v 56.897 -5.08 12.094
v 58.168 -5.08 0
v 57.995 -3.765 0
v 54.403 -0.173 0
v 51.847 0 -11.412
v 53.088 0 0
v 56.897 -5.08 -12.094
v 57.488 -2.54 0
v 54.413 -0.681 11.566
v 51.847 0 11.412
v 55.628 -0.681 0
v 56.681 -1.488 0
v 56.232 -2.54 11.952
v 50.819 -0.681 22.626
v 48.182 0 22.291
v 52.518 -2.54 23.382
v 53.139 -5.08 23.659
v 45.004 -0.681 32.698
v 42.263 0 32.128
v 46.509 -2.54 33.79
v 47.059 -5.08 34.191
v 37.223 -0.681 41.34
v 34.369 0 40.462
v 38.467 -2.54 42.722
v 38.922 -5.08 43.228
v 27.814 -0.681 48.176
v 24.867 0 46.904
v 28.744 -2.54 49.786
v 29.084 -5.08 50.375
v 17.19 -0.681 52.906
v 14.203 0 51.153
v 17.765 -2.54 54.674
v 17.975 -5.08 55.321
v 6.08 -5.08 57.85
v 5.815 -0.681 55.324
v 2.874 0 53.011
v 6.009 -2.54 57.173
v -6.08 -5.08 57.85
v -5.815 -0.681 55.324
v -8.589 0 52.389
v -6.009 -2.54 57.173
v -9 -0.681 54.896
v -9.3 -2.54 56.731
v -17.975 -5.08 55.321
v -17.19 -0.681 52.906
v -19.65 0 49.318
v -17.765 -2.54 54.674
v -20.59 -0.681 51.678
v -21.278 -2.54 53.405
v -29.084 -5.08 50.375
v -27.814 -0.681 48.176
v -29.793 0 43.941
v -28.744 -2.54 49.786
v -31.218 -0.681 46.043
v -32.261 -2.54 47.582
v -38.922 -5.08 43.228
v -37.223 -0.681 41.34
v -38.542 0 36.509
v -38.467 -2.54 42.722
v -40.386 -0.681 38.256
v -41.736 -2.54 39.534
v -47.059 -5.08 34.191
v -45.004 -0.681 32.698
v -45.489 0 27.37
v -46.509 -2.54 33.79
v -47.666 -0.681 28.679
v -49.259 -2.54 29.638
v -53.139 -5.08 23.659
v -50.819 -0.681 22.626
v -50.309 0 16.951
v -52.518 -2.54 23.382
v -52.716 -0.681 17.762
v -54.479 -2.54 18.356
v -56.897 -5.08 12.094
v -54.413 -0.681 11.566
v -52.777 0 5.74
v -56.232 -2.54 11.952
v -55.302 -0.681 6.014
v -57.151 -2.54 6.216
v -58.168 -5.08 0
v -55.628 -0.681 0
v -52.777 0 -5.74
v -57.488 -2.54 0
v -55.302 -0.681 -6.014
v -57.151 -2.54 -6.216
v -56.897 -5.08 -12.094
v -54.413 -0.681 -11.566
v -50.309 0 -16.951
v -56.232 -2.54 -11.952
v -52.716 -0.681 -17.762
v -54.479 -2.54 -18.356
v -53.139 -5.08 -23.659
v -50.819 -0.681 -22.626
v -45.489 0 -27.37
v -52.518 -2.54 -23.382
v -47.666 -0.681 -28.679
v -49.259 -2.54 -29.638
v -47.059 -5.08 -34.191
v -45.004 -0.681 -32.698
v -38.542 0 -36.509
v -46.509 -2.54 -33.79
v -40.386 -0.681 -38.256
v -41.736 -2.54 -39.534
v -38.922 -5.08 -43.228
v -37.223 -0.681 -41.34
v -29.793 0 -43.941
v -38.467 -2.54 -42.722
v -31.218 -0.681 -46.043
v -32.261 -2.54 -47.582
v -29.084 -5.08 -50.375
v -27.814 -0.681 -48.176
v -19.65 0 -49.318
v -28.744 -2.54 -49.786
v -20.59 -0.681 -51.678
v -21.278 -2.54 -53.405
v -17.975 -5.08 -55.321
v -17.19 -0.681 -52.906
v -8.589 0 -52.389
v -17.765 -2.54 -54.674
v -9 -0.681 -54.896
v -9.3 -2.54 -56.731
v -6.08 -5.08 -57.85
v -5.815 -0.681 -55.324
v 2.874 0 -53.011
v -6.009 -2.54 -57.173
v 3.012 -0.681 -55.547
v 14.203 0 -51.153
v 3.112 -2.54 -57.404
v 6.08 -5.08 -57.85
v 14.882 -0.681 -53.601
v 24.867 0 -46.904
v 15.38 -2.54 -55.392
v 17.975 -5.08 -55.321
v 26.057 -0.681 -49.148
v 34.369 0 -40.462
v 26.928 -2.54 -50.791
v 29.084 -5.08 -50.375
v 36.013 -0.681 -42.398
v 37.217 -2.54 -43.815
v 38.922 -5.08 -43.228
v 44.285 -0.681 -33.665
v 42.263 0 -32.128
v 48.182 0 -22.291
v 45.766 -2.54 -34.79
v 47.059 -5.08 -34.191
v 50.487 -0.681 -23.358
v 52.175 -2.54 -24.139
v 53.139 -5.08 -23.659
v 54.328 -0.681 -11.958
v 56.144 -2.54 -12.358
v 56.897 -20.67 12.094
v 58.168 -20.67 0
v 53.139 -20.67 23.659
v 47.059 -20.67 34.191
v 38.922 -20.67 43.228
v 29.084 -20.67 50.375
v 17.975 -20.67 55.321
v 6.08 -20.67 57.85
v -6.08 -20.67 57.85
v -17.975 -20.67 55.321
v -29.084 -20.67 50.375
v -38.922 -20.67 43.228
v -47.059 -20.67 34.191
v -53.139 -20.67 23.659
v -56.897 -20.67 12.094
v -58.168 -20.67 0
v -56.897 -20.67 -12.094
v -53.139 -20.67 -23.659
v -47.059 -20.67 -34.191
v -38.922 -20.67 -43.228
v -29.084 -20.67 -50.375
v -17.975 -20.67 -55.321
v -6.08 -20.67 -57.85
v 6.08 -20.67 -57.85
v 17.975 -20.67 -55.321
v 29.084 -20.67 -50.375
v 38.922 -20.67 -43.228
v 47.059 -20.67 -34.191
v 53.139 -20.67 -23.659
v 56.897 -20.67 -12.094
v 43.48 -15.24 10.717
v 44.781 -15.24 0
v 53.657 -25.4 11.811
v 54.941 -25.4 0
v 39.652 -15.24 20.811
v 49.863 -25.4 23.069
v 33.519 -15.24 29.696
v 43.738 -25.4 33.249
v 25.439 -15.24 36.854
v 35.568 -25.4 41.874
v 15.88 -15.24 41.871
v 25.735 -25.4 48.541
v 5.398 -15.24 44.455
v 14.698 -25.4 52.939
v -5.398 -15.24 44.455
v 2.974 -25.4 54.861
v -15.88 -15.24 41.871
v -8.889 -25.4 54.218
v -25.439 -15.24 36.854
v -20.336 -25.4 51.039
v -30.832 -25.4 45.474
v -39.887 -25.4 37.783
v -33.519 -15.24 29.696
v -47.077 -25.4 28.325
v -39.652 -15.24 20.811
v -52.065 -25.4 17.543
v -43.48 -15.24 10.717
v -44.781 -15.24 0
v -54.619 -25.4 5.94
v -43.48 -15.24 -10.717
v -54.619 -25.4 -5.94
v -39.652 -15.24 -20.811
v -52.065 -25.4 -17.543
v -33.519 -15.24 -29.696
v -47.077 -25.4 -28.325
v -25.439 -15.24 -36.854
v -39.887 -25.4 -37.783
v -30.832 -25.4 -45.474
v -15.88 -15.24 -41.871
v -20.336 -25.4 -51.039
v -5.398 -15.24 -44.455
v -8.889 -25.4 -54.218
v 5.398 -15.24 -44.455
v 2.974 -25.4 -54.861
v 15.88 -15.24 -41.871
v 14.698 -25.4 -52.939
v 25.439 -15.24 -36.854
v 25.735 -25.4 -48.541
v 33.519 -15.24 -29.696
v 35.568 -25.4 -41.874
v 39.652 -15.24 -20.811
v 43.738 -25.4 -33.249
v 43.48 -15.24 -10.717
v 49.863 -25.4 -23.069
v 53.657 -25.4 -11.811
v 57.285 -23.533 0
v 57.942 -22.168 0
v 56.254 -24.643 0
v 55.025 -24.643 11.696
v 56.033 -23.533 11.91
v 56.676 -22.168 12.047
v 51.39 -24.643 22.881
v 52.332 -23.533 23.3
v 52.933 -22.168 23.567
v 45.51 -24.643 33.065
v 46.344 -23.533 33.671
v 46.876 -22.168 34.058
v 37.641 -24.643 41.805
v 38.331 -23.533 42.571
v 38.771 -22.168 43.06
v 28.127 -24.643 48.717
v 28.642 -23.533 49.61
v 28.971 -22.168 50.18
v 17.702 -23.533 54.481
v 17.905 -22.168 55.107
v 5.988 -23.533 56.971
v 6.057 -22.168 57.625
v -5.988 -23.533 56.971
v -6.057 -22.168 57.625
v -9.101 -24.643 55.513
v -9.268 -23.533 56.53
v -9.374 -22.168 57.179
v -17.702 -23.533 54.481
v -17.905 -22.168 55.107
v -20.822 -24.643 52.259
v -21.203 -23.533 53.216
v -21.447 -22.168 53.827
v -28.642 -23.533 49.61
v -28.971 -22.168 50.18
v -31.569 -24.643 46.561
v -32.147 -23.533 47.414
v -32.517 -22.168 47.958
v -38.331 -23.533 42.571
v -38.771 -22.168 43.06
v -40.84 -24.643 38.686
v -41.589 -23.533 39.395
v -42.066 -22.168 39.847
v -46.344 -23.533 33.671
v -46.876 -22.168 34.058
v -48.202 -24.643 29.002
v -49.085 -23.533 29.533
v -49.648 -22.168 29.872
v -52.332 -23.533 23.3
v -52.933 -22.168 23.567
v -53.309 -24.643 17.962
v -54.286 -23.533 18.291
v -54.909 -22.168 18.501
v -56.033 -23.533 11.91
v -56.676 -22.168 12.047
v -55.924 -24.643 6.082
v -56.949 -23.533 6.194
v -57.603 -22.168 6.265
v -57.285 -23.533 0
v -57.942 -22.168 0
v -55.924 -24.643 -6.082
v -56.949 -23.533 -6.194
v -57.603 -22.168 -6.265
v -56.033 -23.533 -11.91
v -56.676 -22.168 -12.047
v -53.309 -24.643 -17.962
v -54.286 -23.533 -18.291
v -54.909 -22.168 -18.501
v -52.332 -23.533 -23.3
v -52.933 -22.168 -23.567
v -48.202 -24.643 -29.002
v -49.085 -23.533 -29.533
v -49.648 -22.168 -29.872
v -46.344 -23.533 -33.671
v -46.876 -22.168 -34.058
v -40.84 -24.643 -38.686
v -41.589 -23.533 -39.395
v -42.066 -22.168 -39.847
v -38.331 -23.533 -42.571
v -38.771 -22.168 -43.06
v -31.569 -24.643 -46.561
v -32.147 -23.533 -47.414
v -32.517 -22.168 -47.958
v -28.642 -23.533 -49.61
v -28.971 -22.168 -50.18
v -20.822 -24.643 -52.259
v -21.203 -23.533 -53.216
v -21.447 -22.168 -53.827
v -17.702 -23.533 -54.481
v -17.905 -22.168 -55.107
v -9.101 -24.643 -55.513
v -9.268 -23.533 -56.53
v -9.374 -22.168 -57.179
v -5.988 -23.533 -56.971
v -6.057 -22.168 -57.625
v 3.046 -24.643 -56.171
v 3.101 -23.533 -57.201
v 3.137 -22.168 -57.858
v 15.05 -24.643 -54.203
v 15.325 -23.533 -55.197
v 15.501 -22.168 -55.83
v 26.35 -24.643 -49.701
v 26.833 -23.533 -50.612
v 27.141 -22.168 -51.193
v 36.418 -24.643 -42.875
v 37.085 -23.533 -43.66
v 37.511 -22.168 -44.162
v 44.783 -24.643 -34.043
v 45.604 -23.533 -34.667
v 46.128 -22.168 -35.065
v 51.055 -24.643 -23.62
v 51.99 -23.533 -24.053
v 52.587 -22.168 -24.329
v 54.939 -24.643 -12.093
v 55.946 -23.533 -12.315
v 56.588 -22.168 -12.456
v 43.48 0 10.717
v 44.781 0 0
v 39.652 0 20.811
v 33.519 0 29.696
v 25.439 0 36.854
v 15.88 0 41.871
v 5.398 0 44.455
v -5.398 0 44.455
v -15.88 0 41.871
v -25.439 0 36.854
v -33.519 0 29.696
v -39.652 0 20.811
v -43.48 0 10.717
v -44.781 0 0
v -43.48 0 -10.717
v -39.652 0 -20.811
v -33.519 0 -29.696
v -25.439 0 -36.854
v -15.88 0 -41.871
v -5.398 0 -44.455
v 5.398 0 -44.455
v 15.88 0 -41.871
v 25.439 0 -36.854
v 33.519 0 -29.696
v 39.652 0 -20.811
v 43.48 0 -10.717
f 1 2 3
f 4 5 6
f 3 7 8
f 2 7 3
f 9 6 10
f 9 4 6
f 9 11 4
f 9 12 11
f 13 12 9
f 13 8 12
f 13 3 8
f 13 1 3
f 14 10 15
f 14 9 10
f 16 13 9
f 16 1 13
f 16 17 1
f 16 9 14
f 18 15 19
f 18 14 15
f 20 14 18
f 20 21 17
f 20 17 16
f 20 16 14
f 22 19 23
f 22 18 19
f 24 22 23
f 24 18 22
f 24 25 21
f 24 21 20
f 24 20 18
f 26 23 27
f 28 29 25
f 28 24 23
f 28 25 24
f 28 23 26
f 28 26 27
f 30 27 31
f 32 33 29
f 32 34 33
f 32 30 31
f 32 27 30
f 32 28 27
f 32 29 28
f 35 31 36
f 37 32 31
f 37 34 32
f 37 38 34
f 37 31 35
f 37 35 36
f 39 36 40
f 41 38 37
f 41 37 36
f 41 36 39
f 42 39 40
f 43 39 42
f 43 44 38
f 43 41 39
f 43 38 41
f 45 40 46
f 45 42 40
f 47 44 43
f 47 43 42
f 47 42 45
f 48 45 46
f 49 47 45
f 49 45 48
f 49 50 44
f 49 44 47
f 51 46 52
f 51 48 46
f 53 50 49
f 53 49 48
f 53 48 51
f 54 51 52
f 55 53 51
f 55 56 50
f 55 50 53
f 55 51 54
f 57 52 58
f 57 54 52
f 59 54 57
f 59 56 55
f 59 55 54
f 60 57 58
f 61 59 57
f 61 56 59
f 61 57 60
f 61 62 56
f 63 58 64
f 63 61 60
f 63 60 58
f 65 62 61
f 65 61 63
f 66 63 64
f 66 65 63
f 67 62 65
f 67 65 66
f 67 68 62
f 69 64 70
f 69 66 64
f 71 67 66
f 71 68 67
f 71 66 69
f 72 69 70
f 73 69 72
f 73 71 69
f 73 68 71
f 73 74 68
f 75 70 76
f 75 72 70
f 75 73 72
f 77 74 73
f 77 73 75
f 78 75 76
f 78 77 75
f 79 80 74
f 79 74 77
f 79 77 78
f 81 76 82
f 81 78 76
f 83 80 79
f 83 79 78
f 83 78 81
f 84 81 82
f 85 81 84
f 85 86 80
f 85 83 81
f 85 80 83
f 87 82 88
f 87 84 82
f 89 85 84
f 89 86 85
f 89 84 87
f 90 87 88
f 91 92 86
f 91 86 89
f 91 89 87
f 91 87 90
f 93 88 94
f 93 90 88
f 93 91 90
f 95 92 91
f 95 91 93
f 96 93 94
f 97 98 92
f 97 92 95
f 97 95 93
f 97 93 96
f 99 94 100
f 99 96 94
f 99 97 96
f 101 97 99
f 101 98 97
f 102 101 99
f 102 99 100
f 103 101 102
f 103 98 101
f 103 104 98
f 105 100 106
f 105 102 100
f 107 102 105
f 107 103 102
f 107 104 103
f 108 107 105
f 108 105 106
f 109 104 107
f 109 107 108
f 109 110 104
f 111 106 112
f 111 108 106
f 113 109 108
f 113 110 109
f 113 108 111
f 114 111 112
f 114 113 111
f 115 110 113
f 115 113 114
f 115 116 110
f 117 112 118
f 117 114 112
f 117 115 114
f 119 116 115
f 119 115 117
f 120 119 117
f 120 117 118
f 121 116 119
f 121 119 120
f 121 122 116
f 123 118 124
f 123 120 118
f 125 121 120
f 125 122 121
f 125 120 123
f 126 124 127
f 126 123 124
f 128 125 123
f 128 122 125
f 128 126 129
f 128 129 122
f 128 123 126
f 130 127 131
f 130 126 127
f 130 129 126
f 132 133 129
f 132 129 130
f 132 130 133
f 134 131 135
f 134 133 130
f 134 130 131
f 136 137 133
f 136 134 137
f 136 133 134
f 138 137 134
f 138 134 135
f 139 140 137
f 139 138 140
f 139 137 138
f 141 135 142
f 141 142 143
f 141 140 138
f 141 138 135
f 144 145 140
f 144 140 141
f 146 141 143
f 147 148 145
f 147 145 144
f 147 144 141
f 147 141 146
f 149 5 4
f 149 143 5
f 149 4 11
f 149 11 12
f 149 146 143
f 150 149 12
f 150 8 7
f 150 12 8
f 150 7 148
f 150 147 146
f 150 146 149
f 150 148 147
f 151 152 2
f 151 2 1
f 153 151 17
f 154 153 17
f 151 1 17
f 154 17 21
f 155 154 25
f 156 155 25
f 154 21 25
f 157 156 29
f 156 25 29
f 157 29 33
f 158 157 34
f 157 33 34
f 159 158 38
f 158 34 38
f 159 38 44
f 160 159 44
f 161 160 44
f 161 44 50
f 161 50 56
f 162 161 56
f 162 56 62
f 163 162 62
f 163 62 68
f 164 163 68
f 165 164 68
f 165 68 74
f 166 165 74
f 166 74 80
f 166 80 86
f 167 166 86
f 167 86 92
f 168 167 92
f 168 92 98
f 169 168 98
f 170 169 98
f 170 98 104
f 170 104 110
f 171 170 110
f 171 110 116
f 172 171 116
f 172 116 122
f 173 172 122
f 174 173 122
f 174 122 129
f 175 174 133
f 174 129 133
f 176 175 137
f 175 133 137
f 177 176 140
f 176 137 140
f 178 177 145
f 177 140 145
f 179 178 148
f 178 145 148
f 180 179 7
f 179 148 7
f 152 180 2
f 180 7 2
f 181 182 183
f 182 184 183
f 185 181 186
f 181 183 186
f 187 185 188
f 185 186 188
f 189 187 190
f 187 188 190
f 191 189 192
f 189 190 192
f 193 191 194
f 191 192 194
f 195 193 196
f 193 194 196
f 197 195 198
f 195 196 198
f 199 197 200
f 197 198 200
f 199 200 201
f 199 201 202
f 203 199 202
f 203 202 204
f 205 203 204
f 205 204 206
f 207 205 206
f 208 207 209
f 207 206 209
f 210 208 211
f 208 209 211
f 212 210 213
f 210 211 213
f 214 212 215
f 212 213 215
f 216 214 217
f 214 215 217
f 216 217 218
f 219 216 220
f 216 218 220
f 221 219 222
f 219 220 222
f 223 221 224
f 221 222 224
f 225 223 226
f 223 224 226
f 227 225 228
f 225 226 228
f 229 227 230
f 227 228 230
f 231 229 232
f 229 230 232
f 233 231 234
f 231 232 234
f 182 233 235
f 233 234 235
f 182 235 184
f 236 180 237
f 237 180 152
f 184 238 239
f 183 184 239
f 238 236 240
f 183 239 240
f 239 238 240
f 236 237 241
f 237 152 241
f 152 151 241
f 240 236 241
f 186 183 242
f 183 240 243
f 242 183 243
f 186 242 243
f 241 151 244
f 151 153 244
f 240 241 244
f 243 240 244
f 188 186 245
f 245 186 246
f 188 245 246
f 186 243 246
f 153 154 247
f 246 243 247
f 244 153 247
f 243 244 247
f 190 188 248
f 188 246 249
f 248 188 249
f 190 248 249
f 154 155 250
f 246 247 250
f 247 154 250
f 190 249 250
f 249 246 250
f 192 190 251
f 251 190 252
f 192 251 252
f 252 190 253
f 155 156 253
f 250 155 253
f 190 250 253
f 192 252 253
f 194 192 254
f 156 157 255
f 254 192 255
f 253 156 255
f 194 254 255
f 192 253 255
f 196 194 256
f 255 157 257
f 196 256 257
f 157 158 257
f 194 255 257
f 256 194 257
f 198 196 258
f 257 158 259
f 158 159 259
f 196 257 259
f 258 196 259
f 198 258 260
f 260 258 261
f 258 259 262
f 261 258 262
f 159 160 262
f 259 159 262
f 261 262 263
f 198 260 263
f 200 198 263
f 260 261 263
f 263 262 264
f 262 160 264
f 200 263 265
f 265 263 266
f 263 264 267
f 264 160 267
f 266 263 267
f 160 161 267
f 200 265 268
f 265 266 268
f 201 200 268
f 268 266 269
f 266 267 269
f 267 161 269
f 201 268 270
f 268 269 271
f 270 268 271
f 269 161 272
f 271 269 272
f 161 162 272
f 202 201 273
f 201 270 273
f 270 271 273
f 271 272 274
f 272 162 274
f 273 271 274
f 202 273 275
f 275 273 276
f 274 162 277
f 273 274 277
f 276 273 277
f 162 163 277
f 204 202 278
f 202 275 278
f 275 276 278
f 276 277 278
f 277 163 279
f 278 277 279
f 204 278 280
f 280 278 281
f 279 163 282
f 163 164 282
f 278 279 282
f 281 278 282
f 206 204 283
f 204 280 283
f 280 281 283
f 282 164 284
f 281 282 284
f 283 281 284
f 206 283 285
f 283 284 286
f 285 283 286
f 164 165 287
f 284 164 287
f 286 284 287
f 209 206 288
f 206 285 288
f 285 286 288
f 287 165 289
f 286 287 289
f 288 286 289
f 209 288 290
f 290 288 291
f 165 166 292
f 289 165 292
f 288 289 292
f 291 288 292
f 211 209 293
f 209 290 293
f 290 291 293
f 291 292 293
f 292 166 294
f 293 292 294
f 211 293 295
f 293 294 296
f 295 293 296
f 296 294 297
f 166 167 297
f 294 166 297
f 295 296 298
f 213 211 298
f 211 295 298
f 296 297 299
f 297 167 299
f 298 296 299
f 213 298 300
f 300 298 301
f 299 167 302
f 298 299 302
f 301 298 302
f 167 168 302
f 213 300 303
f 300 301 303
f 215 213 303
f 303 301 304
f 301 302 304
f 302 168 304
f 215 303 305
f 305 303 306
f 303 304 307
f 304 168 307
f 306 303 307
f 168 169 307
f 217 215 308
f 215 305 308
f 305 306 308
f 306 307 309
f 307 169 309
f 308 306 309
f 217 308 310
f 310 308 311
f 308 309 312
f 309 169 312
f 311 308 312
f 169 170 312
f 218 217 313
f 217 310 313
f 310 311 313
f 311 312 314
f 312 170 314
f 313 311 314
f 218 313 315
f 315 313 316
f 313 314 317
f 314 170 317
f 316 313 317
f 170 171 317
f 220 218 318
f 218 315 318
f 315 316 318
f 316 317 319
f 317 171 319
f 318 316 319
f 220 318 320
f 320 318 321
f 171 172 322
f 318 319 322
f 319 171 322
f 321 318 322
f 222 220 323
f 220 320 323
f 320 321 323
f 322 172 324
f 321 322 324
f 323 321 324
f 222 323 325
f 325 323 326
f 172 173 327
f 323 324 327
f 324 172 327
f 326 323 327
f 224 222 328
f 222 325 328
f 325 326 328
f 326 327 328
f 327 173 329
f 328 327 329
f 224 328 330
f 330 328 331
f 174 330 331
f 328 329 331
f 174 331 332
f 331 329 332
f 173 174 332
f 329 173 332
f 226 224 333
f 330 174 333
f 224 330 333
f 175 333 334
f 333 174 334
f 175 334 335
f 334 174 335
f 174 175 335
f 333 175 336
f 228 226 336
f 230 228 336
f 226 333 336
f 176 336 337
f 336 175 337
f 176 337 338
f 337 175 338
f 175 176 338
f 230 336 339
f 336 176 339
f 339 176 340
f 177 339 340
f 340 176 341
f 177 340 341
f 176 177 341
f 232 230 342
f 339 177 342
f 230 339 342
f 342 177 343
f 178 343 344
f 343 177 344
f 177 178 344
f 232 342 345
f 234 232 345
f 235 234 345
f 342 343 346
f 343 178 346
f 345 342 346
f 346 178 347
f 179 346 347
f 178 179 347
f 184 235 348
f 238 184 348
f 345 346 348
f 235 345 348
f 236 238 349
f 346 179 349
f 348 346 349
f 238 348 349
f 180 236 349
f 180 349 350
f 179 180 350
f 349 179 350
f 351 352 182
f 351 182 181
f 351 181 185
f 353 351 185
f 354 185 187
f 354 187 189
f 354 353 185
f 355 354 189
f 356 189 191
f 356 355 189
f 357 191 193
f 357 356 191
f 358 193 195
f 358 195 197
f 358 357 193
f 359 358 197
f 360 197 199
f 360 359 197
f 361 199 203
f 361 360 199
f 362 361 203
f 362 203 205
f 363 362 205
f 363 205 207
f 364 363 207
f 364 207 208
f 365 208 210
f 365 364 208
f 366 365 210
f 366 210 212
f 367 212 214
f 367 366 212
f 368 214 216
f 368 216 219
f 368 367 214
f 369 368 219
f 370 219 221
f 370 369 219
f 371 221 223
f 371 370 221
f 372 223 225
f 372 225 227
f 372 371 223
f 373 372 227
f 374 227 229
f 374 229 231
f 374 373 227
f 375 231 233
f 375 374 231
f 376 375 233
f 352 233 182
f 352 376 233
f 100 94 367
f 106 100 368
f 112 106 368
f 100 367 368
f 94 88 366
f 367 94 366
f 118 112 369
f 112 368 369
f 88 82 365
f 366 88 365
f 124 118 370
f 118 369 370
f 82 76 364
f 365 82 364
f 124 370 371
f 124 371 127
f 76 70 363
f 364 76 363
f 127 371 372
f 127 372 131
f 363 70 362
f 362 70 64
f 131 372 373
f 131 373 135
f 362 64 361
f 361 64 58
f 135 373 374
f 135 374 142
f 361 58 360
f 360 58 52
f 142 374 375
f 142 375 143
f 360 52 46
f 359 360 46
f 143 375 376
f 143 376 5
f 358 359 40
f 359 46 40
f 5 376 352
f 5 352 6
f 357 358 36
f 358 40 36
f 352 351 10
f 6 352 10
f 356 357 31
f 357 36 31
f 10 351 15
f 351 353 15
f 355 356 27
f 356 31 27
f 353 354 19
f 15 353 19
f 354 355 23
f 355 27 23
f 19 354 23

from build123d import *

# Parameters (mm, degrees)
F0_R     = 58.1684180137
F0_R_2   = 44.7813841063
F1_DEPTH = 25.4
F2_SIZE  = 10.16


# Not quite as in the source:
# - a fillet or chamfer that OpenCascade refuses, or shapes differently, is made with other operations: its cross-section is extruded or revolved along the edge and cut away or added


with BuildPart() as f1:
    # F0 (on Front) → F1 (new body)
    with BuildSketch(Plane.XZ):
        Circle(F0_R)
        Circle(F0_R_2, mode=Mode.SUBTRACT)
    extrude(amount=F1_DEPTH)

    # F2
    f2_edges = [f1.edges().sort_by_distance(p)[0] for p in [
        (-44.781384, -25.4, 0),
    ]]
    chamfer(f2_edges, length=F2_SIZE)

    # F3: fillet of radius 5.08 on 2 edges, made by hand

    # F3_s1 → F3_t2 (revolve, cut)
    with BuildSketch(Plane.XY):
        with BuildLine():
            ThreePointArc((54.9413841063, -25.4), (57.2848133567, -23.5329802725), (58.1684180137, -20.669998239))
            Line((58.1684180137, -20.669998239), (58.1684180137, -25.4))
            Line((58.1684180137, -25.4), (54.9413841063, -25.4))
        make_face()
    revolve(axis=Axis((0, -25.4, 0), (0, -1, 0)), mode=Mode.SUBTRACT)

    # F3_s3 → F3_t4 (revolve, cut)
    with BuildSketch(Plane.XY):
        with BuildLine():
            ThreePointArc((53.0884180137, 0), (56.6805204621, -1.4878975516), (58.1684180137, -5.08))
            Line((58.1684180137, -5.08), (58.1684180137, 0))
            Line((58.1684180137, 0), (53.0884180137, 0))
        make_face()
    revolve(axis=Axis((0, 0, 0), (0, -1, 0)), mode=Mode.SUBTRACT)


solid = f1.part
